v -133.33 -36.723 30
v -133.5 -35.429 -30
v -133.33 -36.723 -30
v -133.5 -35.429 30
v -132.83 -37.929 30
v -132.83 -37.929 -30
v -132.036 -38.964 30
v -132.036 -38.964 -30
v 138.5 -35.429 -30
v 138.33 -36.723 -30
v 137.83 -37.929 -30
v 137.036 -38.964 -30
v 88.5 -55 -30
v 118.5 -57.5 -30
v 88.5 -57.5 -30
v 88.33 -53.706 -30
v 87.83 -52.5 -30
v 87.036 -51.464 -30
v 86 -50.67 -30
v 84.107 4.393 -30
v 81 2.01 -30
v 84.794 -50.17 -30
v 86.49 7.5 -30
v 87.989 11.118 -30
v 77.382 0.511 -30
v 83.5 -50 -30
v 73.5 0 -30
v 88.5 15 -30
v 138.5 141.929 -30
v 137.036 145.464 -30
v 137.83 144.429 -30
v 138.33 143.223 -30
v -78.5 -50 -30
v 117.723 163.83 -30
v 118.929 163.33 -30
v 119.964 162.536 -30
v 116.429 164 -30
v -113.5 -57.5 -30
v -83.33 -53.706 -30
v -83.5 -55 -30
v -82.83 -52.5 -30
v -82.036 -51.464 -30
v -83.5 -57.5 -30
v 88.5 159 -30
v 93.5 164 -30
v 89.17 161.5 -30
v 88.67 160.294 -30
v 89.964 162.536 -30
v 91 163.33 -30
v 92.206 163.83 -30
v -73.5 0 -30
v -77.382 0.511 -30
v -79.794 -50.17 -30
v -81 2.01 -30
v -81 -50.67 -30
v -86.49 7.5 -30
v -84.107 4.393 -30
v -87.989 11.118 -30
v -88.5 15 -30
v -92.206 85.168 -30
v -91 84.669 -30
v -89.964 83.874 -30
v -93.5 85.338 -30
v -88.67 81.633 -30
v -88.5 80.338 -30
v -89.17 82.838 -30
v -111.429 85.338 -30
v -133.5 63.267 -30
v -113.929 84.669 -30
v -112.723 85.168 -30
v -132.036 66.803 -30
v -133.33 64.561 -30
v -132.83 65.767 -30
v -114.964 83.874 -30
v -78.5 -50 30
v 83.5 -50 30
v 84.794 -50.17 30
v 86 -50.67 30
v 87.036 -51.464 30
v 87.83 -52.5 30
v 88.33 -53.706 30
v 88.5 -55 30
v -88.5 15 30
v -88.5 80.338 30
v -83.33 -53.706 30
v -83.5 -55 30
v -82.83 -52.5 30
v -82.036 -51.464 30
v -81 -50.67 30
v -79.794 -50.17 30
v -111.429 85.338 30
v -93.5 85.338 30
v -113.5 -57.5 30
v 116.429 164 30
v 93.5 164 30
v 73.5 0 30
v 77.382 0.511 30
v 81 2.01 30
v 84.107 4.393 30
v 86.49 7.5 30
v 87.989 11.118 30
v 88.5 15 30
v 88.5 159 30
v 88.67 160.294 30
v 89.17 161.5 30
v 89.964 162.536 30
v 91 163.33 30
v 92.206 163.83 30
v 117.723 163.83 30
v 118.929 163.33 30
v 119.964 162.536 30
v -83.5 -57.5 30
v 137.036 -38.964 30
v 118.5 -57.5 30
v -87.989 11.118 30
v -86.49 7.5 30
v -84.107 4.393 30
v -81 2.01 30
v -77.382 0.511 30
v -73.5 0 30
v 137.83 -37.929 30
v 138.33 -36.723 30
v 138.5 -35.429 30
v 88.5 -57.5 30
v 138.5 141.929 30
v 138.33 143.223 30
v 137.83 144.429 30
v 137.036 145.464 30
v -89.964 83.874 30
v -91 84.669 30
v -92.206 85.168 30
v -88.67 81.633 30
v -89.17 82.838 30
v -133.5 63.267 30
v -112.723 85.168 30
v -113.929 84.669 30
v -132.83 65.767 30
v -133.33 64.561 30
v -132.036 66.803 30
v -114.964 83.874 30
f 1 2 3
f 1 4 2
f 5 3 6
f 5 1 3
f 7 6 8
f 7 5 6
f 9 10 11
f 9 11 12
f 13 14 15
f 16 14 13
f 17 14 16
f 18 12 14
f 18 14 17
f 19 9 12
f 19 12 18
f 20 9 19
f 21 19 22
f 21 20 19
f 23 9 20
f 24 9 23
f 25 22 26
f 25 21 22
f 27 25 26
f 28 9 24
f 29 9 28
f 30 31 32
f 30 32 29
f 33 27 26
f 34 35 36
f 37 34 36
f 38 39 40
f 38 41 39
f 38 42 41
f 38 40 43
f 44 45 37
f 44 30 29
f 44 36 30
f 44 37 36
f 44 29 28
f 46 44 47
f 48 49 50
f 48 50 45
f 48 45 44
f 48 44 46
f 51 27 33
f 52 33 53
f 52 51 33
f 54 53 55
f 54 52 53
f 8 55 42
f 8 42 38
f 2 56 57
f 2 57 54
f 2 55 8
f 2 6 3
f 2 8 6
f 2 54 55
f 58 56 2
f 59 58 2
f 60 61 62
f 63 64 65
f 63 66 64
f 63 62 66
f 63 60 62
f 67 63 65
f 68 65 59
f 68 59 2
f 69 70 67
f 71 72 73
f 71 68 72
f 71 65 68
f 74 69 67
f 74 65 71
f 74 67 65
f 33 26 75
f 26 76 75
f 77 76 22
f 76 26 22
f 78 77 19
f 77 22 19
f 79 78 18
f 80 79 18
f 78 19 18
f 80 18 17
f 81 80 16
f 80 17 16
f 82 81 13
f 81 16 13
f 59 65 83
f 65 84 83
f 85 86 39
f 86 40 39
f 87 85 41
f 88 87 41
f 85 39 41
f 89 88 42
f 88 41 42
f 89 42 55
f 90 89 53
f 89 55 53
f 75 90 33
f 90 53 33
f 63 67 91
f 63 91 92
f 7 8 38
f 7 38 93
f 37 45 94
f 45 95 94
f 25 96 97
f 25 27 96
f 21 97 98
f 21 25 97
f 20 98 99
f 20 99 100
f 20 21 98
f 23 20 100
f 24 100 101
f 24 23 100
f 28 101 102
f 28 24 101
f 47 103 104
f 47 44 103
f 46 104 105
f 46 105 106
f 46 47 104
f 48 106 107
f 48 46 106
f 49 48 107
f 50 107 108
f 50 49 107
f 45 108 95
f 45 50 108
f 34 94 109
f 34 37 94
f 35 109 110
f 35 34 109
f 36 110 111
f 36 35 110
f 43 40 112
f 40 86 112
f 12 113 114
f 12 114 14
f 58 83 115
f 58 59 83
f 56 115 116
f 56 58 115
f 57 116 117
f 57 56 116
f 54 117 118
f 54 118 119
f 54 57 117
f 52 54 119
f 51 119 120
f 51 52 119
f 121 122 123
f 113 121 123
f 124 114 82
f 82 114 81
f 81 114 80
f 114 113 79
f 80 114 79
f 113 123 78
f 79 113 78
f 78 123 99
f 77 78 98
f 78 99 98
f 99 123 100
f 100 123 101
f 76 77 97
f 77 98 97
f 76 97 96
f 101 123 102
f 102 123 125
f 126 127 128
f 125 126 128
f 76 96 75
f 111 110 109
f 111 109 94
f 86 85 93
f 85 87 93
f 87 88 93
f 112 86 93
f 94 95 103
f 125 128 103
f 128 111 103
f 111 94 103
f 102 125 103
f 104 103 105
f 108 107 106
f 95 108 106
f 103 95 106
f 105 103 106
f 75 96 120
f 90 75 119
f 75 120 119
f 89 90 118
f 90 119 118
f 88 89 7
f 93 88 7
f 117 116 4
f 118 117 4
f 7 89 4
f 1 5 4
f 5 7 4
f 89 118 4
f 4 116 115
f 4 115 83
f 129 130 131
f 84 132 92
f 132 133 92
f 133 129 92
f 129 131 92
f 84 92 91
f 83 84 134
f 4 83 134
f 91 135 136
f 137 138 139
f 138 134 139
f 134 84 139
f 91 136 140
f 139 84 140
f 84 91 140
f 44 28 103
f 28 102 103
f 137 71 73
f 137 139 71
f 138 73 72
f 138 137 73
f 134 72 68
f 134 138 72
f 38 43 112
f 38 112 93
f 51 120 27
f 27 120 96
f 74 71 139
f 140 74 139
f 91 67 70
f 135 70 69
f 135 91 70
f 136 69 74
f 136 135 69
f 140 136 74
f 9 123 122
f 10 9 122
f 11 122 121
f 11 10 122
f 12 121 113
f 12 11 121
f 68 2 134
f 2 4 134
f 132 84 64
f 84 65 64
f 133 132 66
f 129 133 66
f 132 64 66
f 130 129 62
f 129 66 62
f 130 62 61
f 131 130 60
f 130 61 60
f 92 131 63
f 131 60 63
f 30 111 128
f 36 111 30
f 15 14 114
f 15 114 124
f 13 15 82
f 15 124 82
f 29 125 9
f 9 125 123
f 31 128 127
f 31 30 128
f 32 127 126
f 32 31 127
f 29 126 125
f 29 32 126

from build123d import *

# Parameters (mm, degrees)
BOSS_EXTRUDE1_DEPTH      = 30
BOSS_EXTRUDE1_DEPTH_BACK = 30
CHAMFER1_SIZE            = 20
FILLET1_R                = 15
FILLET2_R                = 5


with BuildPart() as part:
    # Sketch2 → Boss-Extrude1 (new, two sides: drawn at the far end of the back side and taken through both)
    with BuildSketch(Plane.XY.offset(-BOSS_EXTRUDE1_DEPTH_BACK)):
        Polygon((-133.5, 85.338455572), (-88.5, 85.338455572), (-88.5, 0), (88.5, 0), (88.5, 164), (138.5, 164), (138.5, -57.5), (88.5, -57.5), (88.5, -50), (-83.5, -50), (-83.5, -57.5), (-133.5, -57.5), align=None)
    extrude(amount=BOSS_EXTRUDE1_DEPTH + BOSS_EXTRUDE1_DEPTH_BACK)

    # Chamfer1
    chamfer1_edges = [part.edges().sort_by_distance(p)[0] for p in [
        (-133.5, -57.5, 0),
        (138.5, -57.5, 0),
        (138.5, 164, 0),
        (-133.5, 85.338455572, 0),
    ]]
    chamfer(chamfer1_edges, length=CHAMFER1_SIZE)

    # Fillet1
    fillet1_edges = [part.edges().sort_by_distance(p)[0] for p in [
        (88.5, 0, 0),
        (-88.5, 0, 0),
    ]]
    fillet(fillet1_edges, radius=FILLET1_R)

    # Fillet2
    fillet2_edges = [part.edges().sort_by_distance(p)[0] for p in [
        (138.5, -37.5, 0),
        (88.5, -50, 0),
        (-83.5, -50, 0),
        (-133.5, -37.5, 0),
        (-133.5, 65.338455572, 0),
        (-113.5, 85.338455572, 0),
        (-88.5, 85.338455572, 0),
        (138.5, 144, 0),
        (118.5, 164, 0),
        (88.5, 164, 0),
    ]]
    fillet(fillet2_edges, radius=FILLET2_R)


solid = part.part
